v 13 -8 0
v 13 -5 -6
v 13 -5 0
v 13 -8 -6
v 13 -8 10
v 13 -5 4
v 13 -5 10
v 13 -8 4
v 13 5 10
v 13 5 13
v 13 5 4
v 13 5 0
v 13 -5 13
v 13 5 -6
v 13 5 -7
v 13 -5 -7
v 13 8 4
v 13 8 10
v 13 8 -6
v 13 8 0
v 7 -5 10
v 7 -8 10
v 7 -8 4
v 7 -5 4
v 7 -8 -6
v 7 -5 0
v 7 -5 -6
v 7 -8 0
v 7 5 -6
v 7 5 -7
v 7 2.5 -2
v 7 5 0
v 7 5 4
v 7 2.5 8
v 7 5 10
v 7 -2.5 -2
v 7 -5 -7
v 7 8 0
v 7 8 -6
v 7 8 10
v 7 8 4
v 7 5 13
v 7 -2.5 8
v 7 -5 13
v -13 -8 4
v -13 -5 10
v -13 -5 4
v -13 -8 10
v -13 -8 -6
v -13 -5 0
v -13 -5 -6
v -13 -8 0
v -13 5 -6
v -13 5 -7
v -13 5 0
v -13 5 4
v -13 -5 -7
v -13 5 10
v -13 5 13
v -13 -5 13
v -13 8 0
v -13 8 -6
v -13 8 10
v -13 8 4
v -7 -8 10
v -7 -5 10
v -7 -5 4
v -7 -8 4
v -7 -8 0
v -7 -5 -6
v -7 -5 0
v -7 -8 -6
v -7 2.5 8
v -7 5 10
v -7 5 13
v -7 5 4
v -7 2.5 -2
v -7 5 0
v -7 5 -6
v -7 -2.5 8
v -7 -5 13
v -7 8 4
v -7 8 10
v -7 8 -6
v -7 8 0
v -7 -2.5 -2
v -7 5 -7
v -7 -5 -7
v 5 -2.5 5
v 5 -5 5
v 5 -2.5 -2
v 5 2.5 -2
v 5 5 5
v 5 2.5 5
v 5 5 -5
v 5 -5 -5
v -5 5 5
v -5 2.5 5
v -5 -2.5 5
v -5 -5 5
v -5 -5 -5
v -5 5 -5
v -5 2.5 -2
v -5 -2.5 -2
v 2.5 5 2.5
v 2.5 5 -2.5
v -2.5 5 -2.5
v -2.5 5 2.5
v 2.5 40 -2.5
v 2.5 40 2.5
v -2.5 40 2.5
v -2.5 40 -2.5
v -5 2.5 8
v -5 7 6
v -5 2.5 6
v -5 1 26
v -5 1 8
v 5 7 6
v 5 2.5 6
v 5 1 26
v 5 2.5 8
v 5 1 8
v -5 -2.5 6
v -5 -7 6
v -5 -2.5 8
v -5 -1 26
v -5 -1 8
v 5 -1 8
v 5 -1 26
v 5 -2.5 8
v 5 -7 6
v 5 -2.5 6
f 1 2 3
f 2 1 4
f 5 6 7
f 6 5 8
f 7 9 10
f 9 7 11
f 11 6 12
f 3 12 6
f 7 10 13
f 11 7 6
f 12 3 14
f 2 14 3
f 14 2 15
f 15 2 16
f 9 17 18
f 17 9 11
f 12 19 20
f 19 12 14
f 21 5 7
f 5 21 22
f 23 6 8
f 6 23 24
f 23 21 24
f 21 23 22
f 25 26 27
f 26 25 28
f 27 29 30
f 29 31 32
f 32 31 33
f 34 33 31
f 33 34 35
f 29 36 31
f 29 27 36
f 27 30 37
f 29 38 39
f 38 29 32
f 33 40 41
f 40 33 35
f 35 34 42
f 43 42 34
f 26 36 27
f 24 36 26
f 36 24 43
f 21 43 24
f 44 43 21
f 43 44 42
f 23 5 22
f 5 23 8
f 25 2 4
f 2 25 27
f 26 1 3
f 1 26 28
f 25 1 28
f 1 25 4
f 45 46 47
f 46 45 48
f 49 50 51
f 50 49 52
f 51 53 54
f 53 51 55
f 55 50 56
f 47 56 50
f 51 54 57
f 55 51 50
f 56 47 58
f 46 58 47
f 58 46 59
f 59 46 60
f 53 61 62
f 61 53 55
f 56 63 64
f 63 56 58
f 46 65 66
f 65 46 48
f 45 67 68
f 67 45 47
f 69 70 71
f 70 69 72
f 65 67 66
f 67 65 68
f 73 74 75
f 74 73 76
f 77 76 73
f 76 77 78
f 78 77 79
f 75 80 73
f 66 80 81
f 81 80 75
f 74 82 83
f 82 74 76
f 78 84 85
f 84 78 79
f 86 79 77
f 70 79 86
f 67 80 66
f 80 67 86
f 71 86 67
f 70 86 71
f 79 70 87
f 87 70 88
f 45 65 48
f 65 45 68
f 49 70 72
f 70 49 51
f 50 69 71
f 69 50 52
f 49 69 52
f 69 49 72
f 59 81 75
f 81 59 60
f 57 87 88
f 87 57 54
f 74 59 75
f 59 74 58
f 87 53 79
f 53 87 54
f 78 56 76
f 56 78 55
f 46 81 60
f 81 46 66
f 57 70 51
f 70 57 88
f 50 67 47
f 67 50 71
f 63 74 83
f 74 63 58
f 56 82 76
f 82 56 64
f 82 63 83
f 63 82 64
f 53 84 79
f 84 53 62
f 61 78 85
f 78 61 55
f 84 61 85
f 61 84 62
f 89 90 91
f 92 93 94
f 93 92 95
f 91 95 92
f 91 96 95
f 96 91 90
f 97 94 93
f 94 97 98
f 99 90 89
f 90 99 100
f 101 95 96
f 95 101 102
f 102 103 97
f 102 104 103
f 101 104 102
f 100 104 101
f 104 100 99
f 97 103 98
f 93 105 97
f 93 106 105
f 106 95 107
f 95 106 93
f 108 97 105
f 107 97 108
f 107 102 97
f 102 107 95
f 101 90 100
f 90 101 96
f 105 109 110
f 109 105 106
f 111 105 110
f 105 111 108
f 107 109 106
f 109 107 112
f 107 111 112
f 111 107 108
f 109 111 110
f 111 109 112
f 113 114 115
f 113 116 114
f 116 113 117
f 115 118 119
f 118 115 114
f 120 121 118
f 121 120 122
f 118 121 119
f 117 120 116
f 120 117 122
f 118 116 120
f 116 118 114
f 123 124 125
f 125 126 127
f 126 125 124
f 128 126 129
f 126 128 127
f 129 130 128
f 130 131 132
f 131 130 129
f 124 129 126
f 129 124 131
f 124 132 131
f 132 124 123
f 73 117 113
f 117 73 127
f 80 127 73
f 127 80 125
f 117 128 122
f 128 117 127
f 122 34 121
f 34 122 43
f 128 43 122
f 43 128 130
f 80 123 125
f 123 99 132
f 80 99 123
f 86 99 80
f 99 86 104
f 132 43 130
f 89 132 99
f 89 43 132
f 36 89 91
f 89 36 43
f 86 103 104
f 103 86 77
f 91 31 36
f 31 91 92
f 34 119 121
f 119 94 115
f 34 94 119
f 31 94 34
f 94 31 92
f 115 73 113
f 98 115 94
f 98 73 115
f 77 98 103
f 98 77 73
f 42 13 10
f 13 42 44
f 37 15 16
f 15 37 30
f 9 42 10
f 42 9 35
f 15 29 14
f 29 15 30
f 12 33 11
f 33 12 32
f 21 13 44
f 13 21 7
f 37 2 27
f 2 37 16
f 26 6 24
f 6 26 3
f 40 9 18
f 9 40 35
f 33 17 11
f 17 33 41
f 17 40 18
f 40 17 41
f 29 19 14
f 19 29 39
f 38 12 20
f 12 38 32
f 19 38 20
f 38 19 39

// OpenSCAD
baseRanger=20;
alturaRanger=6;
anchoRanger=10;
resolucion=12;
dif=2;

module detalle(){
    translate([anchoRanger-dif,2*baseRanger,anchoRanger-dif])
rotate([0,45,0])
cube([10,2*baseRanger,10],center=true);

mirror([1,0,0]){
translate([anchoRanger-dif,2*baseRanger,anchoRanger-dif])
rotate([0,45,0])
cube([10,2*baseRanger,10],center=true);
}
}

module modulos(){
for(i=[0:11]){
rotate(i*30)
difference(){


translate([0,2*baseRanger,0])
cube([10,baseRanger,10],center=true);

detalle();

}//fin diferencia
}//fin for
}//fin module arco

module arco(){
     
 //arco
difference(){
   cylinder(r=40,h=3,center=true,$fn=resolucion);
   cylinder(r=35,h=6,center=true,$fn=resolucion);
}
//fin arco
}//fin module arco

//arco();
//modulos();
module aquitar(){
cube([10,10,10],center=true);
modulos();
}
//comienza

//cubo de centro
cube([10,10,10],center=true);



//barra conectora
translate([0,baseRanger,0])
cube([5,2*baseRanger,5],center=true);
    //aquitar();


//ranger1
rotate([0,90,0])
translate([-26,1,-anchoRanger/2])
linear_extrude(height=anchoRanger)
polygon(points=[[0,0],[baseRanger,0],[baseRanger,alturaRanger]]);

//ranger2
mirror([0,1,0]){
rotate([0,90,0])
translate([-26,1,-anchoRanger/2])
linear_extrude(height=anchoRanger)
polygon(points=[[0,0],[baseRanger,0],[baseRanger,alturaRanger]]);
}

//bases
translate([0,0,3])
rotate([0,0,90])
cube([anchoRanger/2,3*alturaRanger,baseRanger/2],center=true);

//fin bases

//desembarco1
translate([10,0,3])
cube([alturaRanger,anchoRanger,baseRanger],center=true);

//motores
translate([10,5,7])
cube([alturaRanger,alturaRanger,alturaRanger],center=true);
mirror([0,0,1]){

translate([10,5,3])
cube([alturaRanger,alturaRanger,alturaRanger],center=true);
}

mirror([0,1,0]){
   translate([10,5,7])
cube([alturaRanger,alturaRanger,alturaRanger],center=true);
mirror([0,0,1]){

translate([10,5,3])
cube([alturaRanger,alturaRanger,alturaRanger],center=true);
}

}

//fin desembarco1

mirror([1,0,0]){
 //desembarco1
translate([10,0,3])
cube([alturaRanger,anchoRanger,baseRanger],center=true);  
     
   
   //motores
translate([10,5,7])
cube([alturaRanger,alturaRanger,alturaRanger],center=true);
mirror([0,0,1]){

translate([10,5,3])
cube([alturaRanger,alturaRanger,alturaRanger],center=true);
}

mirror([0,1,0]){
   translate([10,5,7])
cube([alturaRanger,alturaRanger,alturaRanger],center=true);
mirror([0,0,1]){

translate([10,5,3])
cube([alturaRanger,alturaRanger,alturaRanger],center=true);
}

} 
}

//acaba
